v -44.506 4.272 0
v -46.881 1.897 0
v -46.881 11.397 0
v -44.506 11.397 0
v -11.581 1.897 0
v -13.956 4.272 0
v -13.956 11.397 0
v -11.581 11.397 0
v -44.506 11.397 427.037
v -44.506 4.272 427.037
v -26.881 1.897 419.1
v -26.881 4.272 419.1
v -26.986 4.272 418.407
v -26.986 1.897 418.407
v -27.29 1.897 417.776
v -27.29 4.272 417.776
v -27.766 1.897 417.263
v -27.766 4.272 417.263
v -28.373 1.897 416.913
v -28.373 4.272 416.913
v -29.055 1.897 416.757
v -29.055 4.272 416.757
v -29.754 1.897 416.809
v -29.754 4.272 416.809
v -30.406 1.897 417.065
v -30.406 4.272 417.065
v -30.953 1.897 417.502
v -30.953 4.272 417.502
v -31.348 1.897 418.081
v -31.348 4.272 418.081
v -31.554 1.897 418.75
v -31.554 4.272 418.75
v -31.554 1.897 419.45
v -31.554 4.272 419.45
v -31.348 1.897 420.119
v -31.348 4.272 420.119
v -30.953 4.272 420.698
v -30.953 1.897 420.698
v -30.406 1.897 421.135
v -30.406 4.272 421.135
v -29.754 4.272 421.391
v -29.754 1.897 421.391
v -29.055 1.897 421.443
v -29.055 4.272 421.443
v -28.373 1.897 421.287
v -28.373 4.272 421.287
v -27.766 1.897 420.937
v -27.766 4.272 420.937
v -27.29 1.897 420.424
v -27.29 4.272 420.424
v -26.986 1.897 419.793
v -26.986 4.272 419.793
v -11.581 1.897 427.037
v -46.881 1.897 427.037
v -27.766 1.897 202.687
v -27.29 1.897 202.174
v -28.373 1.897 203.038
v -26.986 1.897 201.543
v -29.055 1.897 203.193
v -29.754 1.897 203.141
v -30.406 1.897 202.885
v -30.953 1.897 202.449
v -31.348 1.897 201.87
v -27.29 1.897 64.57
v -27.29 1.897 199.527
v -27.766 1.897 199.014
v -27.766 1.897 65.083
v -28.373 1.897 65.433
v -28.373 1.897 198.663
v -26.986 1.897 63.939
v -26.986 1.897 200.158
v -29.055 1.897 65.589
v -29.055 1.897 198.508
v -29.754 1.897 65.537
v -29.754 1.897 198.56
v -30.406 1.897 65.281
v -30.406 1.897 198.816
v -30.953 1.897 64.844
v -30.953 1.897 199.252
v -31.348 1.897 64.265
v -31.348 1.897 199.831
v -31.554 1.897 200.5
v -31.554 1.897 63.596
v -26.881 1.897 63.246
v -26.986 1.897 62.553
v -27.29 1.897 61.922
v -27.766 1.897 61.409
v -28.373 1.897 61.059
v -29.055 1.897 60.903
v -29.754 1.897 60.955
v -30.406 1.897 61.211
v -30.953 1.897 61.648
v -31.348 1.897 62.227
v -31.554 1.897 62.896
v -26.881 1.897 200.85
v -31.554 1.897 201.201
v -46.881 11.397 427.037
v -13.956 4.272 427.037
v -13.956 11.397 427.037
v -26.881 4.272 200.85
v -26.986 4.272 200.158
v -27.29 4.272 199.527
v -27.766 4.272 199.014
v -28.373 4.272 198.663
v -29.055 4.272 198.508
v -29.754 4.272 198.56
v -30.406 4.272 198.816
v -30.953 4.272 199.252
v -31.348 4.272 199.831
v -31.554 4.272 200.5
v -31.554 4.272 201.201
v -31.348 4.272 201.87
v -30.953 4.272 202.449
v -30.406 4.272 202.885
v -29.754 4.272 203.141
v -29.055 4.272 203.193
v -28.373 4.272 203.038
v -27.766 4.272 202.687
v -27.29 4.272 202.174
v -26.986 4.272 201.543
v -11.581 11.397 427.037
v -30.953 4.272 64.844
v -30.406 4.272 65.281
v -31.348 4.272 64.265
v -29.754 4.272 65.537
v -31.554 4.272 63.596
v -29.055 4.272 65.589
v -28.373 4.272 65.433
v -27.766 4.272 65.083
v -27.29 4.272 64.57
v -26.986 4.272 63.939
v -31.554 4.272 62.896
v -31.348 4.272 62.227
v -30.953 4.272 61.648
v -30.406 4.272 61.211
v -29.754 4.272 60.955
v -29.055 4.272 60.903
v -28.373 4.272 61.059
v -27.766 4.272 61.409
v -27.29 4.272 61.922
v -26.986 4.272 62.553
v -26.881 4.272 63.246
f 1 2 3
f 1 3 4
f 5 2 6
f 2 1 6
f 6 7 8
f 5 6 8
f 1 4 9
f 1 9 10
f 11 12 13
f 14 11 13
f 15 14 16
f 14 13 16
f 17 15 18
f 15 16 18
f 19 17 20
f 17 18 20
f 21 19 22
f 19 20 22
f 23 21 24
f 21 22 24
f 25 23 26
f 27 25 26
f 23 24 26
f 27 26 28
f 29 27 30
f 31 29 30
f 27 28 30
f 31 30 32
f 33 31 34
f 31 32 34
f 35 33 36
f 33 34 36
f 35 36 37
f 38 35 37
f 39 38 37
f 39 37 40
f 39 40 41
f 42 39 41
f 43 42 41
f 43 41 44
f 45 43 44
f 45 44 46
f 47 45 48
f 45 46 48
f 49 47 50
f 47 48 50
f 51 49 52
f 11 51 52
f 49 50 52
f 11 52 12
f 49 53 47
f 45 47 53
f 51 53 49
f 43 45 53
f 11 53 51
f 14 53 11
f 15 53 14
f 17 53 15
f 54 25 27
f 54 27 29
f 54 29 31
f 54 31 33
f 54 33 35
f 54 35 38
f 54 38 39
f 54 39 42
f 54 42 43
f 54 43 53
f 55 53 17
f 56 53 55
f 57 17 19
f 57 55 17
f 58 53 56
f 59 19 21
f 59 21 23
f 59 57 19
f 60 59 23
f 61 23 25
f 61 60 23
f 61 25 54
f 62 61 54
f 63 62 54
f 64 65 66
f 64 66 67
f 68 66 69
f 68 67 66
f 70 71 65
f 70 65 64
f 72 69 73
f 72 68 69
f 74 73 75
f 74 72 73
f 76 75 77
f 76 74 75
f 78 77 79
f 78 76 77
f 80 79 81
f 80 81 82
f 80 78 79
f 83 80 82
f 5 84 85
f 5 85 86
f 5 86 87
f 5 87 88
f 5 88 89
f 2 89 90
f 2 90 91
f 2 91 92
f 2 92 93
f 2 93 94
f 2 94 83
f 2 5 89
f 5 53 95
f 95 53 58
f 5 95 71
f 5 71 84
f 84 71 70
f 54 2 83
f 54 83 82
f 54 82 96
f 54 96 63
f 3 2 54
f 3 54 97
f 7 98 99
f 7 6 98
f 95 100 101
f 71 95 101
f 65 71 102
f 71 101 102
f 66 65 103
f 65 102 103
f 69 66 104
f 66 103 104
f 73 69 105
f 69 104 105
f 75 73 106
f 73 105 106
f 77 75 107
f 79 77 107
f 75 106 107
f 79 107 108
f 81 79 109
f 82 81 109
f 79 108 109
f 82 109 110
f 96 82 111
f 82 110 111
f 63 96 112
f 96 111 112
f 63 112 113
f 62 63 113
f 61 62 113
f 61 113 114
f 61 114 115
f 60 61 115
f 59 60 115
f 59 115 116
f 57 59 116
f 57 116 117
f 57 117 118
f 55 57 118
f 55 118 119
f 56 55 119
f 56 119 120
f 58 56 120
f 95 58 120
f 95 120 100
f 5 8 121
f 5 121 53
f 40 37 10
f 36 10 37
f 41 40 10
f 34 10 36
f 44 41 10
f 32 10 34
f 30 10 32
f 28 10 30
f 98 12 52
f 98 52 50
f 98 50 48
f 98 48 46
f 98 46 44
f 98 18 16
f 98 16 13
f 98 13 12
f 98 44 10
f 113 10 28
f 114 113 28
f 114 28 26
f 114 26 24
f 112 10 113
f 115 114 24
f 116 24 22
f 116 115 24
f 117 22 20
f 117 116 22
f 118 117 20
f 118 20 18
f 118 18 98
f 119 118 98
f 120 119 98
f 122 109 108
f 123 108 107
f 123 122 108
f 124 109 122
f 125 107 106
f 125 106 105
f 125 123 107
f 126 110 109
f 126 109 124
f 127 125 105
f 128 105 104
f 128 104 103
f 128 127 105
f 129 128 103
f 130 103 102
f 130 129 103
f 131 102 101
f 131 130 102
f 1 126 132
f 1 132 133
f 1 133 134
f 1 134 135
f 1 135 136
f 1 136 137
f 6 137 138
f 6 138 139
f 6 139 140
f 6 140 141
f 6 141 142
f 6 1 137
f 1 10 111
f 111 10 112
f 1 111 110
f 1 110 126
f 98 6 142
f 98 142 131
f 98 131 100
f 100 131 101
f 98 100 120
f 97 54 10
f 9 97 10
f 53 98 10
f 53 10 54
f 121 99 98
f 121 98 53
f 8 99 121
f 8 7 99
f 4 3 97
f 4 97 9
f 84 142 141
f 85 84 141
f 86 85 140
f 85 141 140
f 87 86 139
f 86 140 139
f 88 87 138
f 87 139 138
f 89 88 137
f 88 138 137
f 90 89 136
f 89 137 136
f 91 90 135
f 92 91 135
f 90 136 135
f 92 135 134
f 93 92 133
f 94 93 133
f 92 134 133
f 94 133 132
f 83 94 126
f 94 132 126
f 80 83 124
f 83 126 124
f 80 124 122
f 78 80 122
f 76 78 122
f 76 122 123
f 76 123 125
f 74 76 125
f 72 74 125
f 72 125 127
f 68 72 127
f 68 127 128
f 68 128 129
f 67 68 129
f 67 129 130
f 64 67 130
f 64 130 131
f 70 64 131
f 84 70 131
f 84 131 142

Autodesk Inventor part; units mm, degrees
ref_plane "YZ Plane" through (0, 0, 0) normal (1, 0, 0) x (0, 1, 0)
ref_plane "XZ Plane" through (0, 0, 0) normal (0, 1, 0) x (-1, 0, 0)
ref_plane "XY Plane" through (0, 0, 0) normal (0, 0, 1) x (1, 0, 0)
sketch "Sketch1" plane through (0, 0, 0) normal (0, 0, 1) x (1, 0, 0)
  line L0 (-11.5809, 11.3971) -> (-46.8809, 11.3971)
  line L1 (-46.8809, 11.3971) -> (-46.8809, 1.8971)
  line L2 (-46.8809, 1.8971) -> (-11.5809, 1.8971)
  line L3 (-11.5809, 1.8971) -> (-11.5809, 11.3971)
  line L4 (-46.8809, 6.6471) -> (-11.5809, 6.6471)
  line L5 (-11.5809, 6.6471) -> (-11.5809, 1.8971)
  line L6 (-11.5809, 4.2721) -> (-46.8809, 4.2721)
  line L7 (-46.8809, 4.2721) -> (-44.5059, 1.8971)
  line L8 (-46.8809, 4.2721) -> (-43.5221, 4.2721) construction
  line L9 (-44.5059, 1.8971) -> (-44.5059, 11.3971)
  line L10 (-11.5809, 4.2721) -> (-13.9559, 1.8971)
  line L11 (-13.9559, 11.3971) -> (-13.9559, 1.8971)
  point P0 (0, 0)
  dimension "d0" = 35.3
  dimension "d1" = 9.5
  dimension "d2" = 45
extrude "Extrusion1" add sketch "Sketch1" along normal blind 450 contours L3 L4 L11 L0 | L3 L6 L11 L4 | L9 L4 L1 L0 | L10 L11 L6 | L3 L2 L10 | L9 L6 L1 L4 | L11 L2 L9 L6 | L9 L7 L6 | L2 L1 L7
sketch "Sketch2" plane through (-44.5059, 4.2721, 0) normal (0, 1, 0) x (1, 0, 0)
  line L0 (30.55, 0) -> (0, 0) projected
  line L1 (0, -450) -> (30.55, -450) projected
  line L2 (15.275, 0) -> (15.275, -26)
  circle A0 centre (15.275, -26) radius 2.15
  line L3 (15.275, -26) -> (15.275, -410)
  line L4 (15.275, -26) -> (15.275, -378)
  circle A1 centre (15.275, -378) radius 2.15
  circle A2 centre (15.275, -410) radius 2.15
  point P0 (44.5059, 0)
  dimension "d5" = 26
  dimension "d6" = 4.3
  dimension "d7" = 384
  dimension "d8" = 352
extrude "Extrusion2" cut sketch "Sketch2" against normal blind 450
sketch "Sketch3" plane through (0, 0, 450) normal (0, 0, 1) x (1, 0, 0)
  line L0 (-11.5809, 1.8971) -> (-46.8809, 1.8971) projected
  line L1 (-11.5809, 11.3971) -> (-11.5809, 1.8971) projected
  line L2 (-13.9559, 11.3971) -> (-11.5809, 11.3971) projected
  line L3 (-13.9559, 4.2721) -> (-13.9559, 11.3971) projected
  line L4 (-44.5059, 4.2721) -> (-13.9559, 4.2721) projected
  line L5 (-44.5059, 11.3971) -> (-44.5059, 4.2721) projected
  line L6 (-46.8809, 11.3971) -> (-44.5059, 11.3971) projected
  line L7 (-46.8809, 1.8971) -> (-46.8809, 11.3971) projected
  point P0 (0, 0)
extrude "Extrusion3" cut sketch "Sketch3" against normal blind 419.1
sketch "Sketch4" plane through (0, 0, 0) normal (0, 0, -1) x (-1, 0, 0)
  line L0 (11.5809, 1.8971) -> (11.5809, 11.3971) projected
  line L1 (46.8809, 1.8971) -> (11.5809, 1.8971) projected
  line L2 (46.8809, 11.3971) -> (46.8809, 1.8971) projected
  line L3 (44.5059, 11.3971) -> (46.8809, 11.3971) projected
  line L4 (44.5059, 4.2721) -> (44.5059, 11.3971) projected
  line L5 (13.9559, 4.2721) -> (44.5059, 4.2721) projected
  line L6 (13.9559, 11.3971) -> (13.9559, 4.2721) projected
  line L7 (11.5809, 11.3971) -> (13.9559, 11.3971) projected
  point P0 (0, 0)
extrude "Extrusion4" add sketch "Sketch4" against normal blind 426.2437
sketch "Sketch5" plane through (-44.5059, 4.2721, 0) normal (0, 1, 0) x (1, 0, 0)
  line L0 (30.55, 0) -> (0, 0) projected
  line L1 (0, -426.2437) -> (30.55, -426.2437) projected
  line L2 (15.275, 0) -> (15.275, -63.246)
  circle A0 centre (15.275, -63.246) radius 2.3495
  line L3 (15.275, 0) -> (15.275, -203.2)
  line L4 (15.275, -203.2) -> (15.275, -200.8505)
  circle A1 centre (15.275, -200.8505) radius 2.3495
  line L5 (15.275, 0) -> (15.275, -419.1)
  circle A2 centre (15.275, -419.1) radius 2.3495
  point P0 (44.5059, 0)
  dimension "d15" = 63.246
  dimension "d16" = 4.699
  dimension "d17" = 203.2
  dimension "d18" = 2.3495
  dimension "d19" = 419.1
extrude "Extrusion5" cut sketch "Sketch5" against normal blind 426.2437
sketch "Sketch6" plane through (0, 0, 426.2437) normal (0, 0, 1) x (1, 0, 0)
  line L0 (-11.5809, 1.8971) -> (-46.8809, 1.8971) projected
  line L1 (-11.5809, 11.3971) -> (-11.5809, 1.8971) projected
  line L2 (-13.9559, 11.3971) -> (-11.5809, 11.3971) projected
  line L3 (-13.9559, 4.2721) -> (-13.9559, 11.3971) projected
  line L4 (-44.5059, 4.2721) -> (-13.9559, 4.2721) projected
  line L5 (-44.5059, 11.3971) -> (-44.5059, 4.2721) projected
  line L6 (-46.8809, 11.3971) -> (-44.5059, 11.3971) projected
  line L7 (-46.8809, 1.8971) -> (-46.8809, 11.3971) projected
  point P0 (0, 0)
extrude "Extrusion6" add sketch "Sketch6" along normal blind 0.7937
properties part number "1"
